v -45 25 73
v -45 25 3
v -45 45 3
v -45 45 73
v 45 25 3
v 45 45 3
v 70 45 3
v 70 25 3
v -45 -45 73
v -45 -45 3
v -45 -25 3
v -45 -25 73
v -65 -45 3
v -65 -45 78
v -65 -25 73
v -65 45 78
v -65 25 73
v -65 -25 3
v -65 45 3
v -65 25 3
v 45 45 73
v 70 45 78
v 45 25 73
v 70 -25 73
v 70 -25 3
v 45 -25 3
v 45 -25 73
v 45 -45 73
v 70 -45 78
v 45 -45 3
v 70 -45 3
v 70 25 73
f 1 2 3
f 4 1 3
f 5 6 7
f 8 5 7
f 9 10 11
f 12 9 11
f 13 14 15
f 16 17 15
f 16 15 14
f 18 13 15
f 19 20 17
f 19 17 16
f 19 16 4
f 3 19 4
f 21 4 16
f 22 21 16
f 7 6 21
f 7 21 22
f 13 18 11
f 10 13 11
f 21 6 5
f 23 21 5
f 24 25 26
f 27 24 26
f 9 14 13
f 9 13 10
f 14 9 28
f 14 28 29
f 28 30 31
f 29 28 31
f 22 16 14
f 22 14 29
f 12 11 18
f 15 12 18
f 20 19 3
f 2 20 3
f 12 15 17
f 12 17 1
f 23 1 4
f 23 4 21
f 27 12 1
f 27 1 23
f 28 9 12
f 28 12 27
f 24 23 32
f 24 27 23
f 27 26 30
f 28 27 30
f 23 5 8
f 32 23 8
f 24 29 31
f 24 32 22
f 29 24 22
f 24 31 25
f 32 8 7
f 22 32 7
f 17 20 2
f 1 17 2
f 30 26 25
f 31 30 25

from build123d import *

# Parameters (mm, degrees)
TORUS001_R   = 3.1
BOX_W        = 135
BOX_H        = 90
BOX_DEPTH    = 75
POCKET_DEPTH = 70


with BuildPart() as torus001:
    # Torus001 → Torus001 (revolve)
    with BuildSketch(Plane(origin=(-20, 0, 79), x_dir=(1, 0, 0), z_dir=(0, -1, 0))):
        with Locations((35, 0)):
            Circle(TORUS001_R)
    revolve(axis=Axis((-20, 0, 79), (0, 0, 1)))


with BuildPart() as pocket:
    # Box → Box (new body)
    with BuildSketch(Plane.XY):
        with Locations((67.5, 45)):
            Rectangle(BOX_W, BOX_H)
    extrude(amount=BOX_DEPTH)

    # Cut001: cut Torus001
    add(torus001.part, mode=Mode.SUBTRACT)


with BuildPart() as pocket_1:
    # Cut001 placement: moved
    add(pocket.part.moved(Location((-65, -45, 3))))

    # Sketch → Pocket (cut)
    with BuildSketch(Plane(origin=(-65, -45, 3), x_dir=(1, 0, 0), z_dir=(0, 0, -1))):
        Polygon((20, 0), (20, -20), (0, -20), (0, -70), (20, -70), (20, -90), (110, -90), (110, -70), (135, -70), (135, -20), (110, -20), (110, 0), align=None)
    extrude(amount=-POCKET_DEPTH, mode=Mode.SUBTRACT)


solid = pocket_1.part
